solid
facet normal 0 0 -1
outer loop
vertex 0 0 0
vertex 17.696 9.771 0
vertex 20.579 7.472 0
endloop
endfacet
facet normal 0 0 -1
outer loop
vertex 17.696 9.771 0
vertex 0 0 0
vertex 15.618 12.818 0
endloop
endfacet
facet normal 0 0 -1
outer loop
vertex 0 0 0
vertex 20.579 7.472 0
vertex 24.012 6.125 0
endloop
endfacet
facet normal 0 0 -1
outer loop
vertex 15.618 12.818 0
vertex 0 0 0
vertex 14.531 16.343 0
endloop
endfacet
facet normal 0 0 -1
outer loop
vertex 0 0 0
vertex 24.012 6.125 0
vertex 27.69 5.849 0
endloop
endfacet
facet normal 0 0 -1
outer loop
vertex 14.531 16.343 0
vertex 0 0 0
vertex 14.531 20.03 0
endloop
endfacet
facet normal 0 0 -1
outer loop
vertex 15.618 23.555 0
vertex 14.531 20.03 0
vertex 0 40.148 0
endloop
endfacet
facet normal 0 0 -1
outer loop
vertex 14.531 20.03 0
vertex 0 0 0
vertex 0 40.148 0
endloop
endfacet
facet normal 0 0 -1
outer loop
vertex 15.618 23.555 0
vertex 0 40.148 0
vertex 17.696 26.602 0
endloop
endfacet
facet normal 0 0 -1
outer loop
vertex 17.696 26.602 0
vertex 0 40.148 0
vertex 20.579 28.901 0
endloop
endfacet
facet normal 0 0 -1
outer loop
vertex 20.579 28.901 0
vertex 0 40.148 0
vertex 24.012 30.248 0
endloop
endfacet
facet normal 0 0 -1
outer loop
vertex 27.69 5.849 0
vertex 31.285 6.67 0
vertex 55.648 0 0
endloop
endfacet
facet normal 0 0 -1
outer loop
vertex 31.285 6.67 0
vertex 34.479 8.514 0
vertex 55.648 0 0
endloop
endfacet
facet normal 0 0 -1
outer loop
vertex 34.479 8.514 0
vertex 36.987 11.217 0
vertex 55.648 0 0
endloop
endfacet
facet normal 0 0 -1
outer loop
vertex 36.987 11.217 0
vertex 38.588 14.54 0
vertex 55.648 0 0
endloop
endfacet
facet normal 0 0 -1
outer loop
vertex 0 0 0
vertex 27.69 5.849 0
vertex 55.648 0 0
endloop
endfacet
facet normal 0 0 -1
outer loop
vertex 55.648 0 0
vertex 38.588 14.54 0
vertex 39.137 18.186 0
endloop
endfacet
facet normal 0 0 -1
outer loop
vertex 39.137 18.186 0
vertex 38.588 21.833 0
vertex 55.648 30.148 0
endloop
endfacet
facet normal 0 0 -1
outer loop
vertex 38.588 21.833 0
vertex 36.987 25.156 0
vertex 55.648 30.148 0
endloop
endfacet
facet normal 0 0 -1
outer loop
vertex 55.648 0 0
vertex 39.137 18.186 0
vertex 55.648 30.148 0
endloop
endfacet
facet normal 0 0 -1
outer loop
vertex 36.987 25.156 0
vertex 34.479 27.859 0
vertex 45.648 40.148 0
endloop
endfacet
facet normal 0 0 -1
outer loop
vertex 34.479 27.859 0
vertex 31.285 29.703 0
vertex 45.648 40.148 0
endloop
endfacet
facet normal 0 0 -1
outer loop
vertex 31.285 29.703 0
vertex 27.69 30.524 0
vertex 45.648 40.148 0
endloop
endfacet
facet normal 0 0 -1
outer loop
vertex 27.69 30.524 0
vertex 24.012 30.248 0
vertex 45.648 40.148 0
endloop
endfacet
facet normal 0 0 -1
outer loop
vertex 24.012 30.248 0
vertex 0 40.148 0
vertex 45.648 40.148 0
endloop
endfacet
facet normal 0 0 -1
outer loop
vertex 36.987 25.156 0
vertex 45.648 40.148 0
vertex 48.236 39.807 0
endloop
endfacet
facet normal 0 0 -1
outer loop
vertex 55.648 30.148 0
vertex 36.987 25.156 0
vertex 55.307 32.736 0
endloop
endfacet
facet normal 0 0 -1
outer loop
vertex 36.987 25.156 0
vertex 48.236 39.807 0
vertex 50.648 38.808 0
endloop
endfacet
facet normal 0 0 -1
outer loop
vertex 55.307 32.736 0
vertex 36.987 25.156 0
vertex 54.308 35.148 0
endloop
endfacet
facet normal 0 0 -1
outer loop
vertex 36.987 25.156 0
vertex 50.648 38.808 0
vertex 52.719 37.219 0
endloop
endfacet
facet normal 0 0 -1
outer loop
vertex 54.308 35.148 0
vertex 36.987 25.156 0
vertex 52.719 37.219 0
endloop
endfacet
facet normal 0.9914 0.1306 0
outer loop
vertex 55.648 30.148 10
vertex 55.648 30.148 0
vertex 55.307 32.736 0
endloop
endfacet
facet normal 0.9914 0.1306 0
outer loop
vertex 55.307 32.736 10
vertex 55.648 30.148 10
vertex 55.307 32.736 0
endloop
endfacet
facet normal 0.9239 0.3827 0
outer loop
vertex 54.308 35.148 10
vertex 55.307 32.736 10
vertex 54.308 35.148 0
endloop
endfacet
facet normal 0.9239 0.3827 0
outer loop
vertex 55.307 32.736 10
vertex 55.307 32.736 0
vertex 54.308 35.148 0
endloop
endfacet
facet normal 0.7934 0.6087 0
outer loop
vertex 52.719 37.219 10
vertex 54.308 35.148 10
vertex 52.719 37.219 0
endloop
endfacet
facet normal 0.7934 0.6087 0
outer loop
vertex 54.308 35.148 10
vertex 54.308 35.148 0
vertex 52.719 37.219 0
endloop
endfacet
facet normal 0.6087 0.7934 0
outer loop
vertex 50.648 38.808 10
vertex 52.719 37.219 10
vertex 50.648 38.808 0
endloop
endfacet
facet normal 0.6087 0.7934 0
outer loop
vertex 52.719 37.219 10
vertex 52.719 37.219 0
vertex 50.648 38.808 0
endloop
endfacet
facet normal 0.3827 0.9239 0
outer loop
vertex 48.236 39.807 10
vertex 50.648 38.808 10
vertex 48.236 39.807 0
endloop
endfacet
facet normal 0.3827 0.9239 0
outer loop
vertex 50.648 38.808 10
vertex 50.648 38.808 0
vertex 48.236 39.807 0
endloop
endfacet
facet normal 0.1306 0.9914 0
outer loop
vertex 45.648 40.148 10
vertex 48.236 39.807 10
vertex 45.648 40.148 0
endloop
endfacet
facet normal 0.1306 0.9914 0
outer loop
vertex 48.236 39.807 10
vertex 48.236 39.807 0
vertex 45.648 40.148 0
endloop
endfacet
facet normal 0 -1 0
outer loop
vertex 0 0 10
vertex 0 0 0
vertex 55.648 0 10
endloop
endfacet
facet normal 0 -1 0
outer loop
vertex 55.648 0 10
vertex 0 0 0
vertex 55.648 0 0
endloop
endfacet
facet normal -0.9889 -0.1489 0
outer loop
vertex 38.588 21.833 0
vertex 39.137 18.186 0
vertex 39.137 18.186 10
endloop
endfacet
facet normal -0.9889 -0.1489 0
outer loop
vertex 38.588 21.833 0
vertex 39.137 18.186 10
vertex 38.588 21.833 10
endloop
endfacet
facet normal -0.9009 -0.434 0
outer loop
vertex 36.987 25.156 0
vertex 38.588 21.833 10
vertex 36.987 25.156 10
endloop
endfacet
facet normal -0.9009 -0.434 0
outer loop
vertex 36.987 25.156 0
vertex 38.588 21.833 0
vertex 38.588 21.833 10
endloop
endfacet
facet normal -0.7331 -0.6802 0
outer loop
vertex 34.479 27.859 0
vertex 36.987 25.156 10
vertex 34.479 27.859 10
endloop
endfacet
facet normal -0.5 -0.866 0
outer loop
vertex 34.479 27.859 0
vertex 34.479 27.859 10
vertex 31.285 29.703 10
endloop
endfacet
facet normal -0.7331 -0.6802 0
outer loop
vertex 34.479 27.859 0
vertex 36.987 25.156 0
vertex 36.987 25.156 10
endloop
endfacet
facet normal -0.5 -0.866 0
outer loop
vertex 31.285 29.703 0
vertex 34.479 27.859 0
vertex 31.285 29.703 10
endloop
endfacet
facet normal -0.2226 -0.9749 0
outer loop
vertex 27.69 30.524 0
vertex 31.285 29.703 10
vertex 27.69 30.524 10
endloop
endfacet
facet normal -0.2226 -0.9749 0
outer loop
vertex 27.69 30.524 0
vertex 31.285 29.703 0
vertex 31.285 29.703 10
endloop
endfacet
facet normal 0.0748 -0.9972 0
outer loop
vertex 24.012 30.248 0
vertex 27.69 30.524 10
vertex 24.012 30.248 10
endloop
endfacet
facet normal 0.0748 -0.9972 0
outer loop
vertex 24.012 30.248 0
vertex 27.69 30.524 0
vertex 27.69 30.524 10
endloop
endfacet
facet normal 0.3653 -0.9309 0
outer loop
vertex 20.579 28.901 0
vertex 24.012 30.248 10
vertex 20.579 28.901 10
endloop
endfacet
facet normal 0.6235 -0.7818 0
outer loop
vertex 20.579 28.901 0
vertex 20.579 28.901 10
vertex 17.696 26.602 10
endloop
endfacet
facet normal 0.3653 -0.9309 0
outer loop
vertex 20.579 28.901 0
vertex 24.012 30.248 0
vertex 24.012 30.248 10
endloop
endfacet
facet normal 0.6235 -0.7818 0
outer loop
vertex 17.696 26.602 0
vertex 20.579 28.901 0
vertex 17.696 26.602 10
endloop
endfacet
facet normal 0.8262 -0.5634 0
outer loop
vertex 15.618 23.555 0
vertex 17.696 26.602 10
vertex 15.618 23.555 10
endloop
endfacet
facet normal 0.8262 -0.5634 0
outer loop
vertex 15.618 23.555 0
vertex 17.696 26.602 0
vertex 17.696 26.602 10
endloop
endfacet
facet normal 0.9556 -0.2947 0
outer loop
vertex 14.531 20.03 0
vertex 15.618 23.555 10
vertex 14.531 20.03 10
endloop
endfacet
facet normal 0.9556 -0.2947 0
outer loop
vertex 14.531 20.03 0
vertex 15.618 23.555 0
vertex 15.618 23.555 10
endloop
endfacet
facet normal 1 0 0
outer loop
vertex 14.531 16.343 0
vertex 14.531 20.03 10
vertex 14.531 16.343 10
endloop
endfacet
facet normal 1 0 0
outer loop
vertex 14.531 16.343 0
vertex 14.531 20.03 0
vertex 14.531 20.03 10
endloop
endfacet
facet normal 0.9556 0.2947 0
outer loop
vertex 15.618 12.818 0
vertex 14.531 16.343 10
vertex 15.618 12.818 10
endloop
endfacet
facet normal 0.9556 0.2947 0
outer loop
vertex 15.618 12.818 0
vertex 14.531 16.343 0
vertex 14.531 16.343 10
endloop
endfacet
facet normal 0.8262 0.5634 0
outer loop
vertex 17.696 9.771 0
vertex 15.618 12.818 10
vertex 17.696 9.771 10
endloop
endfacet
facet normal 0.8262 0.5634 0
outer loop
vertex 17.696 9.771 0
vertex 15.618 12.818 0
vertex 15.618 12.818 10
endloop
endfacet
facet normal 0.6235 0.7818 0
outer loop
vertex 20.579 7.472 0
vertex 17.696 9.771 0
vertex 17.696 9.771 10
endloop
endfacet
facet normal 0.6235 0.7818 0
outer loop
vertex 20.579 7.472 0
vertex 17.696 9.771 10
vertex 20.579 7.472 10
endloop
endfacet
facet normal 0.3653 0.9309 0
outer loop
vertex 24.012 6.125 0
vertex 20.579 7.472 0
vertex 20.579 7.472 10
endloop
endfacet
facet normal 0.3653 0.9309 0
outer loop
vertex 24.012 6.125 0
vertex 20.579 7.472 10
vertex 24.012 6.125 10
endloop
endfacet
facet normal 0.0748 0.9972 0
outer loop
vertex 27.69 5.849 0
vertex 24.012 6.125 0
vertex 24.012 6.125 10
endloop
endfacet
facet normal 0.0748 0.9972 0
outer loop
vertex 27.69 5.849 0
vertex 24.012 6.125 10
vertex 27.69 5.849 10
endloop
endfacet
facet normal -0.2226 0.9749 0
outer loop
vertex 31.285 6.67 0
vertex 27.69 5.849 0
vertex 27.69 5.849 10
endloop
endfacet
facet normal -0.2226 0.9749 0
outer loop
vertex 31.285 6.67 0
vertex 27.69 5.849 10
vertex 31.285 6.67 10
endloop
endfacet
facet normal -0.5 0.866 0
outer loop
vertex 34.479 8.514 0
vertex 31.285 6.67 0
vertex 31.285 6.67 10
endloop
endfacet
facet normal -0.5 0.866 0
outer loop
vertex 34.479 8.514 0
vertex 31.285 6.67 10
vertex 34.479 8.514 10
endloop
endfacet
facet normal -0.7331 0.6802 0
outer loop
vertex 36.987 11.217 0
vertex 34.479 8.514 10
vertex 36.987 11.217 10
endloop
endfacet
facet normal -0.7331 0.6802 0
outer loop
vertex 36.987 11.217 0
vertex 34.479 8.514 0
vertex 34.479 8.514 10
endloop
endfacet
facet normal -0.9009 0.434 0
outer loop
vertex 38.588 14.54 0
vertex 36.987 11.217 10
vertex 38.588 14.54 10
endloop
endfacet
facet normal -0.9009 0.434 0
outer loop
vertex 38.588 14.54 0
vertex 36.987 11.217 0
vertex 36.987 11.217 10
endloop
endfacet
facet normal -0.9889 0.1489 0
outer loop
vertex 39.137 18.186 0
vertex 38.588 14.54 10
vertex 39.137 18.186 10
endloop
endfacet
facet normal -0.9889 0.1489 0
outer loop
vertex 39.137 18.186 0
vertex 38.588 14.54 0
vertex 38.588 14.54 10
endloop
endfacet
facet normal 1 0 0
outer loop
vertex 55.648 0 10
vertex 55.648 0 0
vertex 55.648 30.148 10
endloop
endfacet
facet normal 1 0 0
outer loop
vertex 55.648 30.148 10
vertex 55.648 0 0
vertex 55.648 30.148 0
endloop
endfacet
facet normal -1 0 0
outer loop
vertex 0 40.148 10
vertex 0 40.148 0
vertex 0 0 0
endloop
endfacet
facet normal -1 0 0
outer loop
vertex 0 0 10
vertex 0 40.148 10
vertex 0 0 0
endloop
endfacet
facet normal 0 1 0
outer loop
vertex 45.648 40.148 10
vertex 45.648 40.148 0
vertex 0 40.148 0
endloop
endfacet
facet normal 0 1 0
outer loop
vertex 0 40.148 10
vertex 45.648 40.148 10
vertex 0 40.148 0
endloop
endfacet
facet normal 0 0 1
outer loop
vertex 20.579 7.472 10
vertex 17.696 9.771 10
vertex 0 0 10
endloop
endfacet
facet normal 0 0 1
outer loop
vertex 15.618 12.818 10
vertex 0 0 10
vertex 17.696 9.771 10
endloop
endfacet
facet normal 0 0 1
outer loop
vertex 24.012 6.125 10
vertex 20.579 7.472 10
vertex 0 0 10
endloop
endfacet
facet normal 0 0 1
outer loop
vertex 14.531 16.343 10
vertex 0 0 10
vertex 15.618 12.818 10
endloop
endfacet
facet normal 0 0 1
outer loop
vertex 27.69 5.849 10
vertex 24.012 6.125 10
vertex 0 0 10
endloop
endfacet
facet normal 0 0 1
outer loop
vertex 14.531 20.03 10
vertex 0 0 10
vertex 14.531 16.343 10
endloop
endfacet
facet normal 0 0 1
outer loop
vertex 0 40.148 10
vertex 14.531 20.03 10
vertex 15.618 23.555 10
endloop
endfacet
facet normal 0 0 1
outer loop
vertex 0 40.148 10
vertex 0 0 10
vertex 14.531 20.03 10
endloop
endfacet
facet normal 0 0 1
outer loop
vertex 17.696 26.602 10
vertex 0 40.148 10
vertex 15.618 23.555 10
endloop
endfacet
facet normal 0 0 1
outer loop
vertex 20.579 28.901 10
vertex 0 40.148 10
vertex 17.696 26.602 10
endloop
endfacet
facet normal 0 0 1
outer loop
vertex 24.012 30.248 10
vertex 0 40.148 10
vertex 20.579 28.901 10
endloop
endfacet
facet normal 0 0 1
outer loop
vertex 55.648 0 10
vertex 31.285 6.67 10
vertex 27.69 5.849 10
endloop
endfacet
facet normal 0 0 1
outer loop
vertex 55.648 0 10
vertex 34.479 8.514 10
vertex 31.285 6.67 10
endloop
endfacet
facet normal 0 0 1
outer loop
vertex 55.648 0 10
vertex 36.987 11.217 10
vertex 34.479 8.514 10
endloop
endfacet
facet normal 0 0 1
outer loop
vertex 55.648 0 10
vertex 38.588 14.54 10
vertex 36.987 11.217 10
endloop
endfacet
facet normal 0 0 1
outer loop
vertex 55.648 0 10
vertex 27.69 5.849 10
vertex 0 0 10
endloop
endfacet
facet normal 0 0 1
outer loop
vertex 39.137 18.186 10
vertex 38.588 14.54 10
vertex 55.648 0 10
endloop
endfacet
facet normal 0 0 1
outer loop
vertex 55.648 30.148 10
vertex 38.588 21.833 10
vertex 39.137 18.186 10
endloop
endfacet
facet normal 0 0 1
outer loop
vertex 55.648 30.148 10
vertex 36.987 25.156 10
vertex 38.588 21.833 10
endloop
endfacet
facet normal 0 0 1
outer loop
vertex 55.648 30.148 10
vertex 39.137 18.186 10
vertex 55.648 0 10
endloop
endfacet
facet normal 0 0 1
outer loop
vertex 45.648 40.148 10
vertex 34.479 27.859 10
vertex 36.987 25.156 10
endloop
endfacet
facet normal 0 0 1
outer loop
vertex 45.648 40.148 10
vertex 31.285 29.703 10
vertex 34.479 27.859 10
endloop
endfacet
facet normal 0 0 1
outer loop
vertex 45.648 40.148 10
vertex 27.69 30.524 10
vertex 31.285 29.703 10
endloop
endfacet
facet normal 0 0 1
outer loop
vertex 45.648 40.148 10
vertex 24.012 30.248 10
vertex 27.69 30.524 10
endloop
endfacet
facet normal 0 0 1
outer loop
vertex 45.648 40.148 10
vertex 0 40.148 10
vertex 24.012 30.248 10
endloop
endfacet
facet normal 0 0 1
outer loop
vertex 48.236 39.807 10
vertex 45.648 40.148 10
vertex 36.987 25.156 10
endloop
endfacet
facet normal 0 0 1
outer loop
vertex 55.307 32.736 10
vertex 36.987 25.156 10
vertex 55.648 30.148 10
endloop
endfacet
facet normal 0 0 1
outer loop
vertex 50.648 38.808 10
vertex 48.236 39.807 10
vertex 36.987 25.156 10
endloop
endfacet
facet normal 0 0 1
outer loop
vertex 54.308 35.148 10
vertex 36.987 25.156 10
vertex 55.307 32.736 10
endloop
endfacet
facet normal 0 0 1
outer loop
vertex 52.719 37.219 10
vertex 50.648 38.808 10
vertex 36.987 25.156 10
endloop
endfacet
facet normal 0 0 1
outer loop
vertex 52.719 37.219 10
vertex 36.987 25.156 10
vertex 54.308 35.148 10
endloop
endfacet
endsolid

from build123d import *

# Parameters (mm, degrees)
F0_R     = 12.37214
F1_DEPTH = 10


with BuildPart() as f1:
    # F0 (on Top) → F1 (new body)
    with BuildSketch(Plane.XY):
        with BuildLine():
            Line((0, 40.147543), (0, 0))
            Line((0, 0), (55.64775, 0))
            Line((55.64775, 0), (55.64775, 30.147543))
            ThreePointArc((55.64775, 30.147543), (52.718818, 37.218611), (45.64775, 40.147543))
            Line((45.64775, 40.147543), (0, 40.147543))
        make_face()
        with Locations((26.765032, 18.186493)):
            Circle(F0_R, mode=Mode.SUBTRACT)
    extrude(amount=F1_DEPTH)


solid = f1.part
